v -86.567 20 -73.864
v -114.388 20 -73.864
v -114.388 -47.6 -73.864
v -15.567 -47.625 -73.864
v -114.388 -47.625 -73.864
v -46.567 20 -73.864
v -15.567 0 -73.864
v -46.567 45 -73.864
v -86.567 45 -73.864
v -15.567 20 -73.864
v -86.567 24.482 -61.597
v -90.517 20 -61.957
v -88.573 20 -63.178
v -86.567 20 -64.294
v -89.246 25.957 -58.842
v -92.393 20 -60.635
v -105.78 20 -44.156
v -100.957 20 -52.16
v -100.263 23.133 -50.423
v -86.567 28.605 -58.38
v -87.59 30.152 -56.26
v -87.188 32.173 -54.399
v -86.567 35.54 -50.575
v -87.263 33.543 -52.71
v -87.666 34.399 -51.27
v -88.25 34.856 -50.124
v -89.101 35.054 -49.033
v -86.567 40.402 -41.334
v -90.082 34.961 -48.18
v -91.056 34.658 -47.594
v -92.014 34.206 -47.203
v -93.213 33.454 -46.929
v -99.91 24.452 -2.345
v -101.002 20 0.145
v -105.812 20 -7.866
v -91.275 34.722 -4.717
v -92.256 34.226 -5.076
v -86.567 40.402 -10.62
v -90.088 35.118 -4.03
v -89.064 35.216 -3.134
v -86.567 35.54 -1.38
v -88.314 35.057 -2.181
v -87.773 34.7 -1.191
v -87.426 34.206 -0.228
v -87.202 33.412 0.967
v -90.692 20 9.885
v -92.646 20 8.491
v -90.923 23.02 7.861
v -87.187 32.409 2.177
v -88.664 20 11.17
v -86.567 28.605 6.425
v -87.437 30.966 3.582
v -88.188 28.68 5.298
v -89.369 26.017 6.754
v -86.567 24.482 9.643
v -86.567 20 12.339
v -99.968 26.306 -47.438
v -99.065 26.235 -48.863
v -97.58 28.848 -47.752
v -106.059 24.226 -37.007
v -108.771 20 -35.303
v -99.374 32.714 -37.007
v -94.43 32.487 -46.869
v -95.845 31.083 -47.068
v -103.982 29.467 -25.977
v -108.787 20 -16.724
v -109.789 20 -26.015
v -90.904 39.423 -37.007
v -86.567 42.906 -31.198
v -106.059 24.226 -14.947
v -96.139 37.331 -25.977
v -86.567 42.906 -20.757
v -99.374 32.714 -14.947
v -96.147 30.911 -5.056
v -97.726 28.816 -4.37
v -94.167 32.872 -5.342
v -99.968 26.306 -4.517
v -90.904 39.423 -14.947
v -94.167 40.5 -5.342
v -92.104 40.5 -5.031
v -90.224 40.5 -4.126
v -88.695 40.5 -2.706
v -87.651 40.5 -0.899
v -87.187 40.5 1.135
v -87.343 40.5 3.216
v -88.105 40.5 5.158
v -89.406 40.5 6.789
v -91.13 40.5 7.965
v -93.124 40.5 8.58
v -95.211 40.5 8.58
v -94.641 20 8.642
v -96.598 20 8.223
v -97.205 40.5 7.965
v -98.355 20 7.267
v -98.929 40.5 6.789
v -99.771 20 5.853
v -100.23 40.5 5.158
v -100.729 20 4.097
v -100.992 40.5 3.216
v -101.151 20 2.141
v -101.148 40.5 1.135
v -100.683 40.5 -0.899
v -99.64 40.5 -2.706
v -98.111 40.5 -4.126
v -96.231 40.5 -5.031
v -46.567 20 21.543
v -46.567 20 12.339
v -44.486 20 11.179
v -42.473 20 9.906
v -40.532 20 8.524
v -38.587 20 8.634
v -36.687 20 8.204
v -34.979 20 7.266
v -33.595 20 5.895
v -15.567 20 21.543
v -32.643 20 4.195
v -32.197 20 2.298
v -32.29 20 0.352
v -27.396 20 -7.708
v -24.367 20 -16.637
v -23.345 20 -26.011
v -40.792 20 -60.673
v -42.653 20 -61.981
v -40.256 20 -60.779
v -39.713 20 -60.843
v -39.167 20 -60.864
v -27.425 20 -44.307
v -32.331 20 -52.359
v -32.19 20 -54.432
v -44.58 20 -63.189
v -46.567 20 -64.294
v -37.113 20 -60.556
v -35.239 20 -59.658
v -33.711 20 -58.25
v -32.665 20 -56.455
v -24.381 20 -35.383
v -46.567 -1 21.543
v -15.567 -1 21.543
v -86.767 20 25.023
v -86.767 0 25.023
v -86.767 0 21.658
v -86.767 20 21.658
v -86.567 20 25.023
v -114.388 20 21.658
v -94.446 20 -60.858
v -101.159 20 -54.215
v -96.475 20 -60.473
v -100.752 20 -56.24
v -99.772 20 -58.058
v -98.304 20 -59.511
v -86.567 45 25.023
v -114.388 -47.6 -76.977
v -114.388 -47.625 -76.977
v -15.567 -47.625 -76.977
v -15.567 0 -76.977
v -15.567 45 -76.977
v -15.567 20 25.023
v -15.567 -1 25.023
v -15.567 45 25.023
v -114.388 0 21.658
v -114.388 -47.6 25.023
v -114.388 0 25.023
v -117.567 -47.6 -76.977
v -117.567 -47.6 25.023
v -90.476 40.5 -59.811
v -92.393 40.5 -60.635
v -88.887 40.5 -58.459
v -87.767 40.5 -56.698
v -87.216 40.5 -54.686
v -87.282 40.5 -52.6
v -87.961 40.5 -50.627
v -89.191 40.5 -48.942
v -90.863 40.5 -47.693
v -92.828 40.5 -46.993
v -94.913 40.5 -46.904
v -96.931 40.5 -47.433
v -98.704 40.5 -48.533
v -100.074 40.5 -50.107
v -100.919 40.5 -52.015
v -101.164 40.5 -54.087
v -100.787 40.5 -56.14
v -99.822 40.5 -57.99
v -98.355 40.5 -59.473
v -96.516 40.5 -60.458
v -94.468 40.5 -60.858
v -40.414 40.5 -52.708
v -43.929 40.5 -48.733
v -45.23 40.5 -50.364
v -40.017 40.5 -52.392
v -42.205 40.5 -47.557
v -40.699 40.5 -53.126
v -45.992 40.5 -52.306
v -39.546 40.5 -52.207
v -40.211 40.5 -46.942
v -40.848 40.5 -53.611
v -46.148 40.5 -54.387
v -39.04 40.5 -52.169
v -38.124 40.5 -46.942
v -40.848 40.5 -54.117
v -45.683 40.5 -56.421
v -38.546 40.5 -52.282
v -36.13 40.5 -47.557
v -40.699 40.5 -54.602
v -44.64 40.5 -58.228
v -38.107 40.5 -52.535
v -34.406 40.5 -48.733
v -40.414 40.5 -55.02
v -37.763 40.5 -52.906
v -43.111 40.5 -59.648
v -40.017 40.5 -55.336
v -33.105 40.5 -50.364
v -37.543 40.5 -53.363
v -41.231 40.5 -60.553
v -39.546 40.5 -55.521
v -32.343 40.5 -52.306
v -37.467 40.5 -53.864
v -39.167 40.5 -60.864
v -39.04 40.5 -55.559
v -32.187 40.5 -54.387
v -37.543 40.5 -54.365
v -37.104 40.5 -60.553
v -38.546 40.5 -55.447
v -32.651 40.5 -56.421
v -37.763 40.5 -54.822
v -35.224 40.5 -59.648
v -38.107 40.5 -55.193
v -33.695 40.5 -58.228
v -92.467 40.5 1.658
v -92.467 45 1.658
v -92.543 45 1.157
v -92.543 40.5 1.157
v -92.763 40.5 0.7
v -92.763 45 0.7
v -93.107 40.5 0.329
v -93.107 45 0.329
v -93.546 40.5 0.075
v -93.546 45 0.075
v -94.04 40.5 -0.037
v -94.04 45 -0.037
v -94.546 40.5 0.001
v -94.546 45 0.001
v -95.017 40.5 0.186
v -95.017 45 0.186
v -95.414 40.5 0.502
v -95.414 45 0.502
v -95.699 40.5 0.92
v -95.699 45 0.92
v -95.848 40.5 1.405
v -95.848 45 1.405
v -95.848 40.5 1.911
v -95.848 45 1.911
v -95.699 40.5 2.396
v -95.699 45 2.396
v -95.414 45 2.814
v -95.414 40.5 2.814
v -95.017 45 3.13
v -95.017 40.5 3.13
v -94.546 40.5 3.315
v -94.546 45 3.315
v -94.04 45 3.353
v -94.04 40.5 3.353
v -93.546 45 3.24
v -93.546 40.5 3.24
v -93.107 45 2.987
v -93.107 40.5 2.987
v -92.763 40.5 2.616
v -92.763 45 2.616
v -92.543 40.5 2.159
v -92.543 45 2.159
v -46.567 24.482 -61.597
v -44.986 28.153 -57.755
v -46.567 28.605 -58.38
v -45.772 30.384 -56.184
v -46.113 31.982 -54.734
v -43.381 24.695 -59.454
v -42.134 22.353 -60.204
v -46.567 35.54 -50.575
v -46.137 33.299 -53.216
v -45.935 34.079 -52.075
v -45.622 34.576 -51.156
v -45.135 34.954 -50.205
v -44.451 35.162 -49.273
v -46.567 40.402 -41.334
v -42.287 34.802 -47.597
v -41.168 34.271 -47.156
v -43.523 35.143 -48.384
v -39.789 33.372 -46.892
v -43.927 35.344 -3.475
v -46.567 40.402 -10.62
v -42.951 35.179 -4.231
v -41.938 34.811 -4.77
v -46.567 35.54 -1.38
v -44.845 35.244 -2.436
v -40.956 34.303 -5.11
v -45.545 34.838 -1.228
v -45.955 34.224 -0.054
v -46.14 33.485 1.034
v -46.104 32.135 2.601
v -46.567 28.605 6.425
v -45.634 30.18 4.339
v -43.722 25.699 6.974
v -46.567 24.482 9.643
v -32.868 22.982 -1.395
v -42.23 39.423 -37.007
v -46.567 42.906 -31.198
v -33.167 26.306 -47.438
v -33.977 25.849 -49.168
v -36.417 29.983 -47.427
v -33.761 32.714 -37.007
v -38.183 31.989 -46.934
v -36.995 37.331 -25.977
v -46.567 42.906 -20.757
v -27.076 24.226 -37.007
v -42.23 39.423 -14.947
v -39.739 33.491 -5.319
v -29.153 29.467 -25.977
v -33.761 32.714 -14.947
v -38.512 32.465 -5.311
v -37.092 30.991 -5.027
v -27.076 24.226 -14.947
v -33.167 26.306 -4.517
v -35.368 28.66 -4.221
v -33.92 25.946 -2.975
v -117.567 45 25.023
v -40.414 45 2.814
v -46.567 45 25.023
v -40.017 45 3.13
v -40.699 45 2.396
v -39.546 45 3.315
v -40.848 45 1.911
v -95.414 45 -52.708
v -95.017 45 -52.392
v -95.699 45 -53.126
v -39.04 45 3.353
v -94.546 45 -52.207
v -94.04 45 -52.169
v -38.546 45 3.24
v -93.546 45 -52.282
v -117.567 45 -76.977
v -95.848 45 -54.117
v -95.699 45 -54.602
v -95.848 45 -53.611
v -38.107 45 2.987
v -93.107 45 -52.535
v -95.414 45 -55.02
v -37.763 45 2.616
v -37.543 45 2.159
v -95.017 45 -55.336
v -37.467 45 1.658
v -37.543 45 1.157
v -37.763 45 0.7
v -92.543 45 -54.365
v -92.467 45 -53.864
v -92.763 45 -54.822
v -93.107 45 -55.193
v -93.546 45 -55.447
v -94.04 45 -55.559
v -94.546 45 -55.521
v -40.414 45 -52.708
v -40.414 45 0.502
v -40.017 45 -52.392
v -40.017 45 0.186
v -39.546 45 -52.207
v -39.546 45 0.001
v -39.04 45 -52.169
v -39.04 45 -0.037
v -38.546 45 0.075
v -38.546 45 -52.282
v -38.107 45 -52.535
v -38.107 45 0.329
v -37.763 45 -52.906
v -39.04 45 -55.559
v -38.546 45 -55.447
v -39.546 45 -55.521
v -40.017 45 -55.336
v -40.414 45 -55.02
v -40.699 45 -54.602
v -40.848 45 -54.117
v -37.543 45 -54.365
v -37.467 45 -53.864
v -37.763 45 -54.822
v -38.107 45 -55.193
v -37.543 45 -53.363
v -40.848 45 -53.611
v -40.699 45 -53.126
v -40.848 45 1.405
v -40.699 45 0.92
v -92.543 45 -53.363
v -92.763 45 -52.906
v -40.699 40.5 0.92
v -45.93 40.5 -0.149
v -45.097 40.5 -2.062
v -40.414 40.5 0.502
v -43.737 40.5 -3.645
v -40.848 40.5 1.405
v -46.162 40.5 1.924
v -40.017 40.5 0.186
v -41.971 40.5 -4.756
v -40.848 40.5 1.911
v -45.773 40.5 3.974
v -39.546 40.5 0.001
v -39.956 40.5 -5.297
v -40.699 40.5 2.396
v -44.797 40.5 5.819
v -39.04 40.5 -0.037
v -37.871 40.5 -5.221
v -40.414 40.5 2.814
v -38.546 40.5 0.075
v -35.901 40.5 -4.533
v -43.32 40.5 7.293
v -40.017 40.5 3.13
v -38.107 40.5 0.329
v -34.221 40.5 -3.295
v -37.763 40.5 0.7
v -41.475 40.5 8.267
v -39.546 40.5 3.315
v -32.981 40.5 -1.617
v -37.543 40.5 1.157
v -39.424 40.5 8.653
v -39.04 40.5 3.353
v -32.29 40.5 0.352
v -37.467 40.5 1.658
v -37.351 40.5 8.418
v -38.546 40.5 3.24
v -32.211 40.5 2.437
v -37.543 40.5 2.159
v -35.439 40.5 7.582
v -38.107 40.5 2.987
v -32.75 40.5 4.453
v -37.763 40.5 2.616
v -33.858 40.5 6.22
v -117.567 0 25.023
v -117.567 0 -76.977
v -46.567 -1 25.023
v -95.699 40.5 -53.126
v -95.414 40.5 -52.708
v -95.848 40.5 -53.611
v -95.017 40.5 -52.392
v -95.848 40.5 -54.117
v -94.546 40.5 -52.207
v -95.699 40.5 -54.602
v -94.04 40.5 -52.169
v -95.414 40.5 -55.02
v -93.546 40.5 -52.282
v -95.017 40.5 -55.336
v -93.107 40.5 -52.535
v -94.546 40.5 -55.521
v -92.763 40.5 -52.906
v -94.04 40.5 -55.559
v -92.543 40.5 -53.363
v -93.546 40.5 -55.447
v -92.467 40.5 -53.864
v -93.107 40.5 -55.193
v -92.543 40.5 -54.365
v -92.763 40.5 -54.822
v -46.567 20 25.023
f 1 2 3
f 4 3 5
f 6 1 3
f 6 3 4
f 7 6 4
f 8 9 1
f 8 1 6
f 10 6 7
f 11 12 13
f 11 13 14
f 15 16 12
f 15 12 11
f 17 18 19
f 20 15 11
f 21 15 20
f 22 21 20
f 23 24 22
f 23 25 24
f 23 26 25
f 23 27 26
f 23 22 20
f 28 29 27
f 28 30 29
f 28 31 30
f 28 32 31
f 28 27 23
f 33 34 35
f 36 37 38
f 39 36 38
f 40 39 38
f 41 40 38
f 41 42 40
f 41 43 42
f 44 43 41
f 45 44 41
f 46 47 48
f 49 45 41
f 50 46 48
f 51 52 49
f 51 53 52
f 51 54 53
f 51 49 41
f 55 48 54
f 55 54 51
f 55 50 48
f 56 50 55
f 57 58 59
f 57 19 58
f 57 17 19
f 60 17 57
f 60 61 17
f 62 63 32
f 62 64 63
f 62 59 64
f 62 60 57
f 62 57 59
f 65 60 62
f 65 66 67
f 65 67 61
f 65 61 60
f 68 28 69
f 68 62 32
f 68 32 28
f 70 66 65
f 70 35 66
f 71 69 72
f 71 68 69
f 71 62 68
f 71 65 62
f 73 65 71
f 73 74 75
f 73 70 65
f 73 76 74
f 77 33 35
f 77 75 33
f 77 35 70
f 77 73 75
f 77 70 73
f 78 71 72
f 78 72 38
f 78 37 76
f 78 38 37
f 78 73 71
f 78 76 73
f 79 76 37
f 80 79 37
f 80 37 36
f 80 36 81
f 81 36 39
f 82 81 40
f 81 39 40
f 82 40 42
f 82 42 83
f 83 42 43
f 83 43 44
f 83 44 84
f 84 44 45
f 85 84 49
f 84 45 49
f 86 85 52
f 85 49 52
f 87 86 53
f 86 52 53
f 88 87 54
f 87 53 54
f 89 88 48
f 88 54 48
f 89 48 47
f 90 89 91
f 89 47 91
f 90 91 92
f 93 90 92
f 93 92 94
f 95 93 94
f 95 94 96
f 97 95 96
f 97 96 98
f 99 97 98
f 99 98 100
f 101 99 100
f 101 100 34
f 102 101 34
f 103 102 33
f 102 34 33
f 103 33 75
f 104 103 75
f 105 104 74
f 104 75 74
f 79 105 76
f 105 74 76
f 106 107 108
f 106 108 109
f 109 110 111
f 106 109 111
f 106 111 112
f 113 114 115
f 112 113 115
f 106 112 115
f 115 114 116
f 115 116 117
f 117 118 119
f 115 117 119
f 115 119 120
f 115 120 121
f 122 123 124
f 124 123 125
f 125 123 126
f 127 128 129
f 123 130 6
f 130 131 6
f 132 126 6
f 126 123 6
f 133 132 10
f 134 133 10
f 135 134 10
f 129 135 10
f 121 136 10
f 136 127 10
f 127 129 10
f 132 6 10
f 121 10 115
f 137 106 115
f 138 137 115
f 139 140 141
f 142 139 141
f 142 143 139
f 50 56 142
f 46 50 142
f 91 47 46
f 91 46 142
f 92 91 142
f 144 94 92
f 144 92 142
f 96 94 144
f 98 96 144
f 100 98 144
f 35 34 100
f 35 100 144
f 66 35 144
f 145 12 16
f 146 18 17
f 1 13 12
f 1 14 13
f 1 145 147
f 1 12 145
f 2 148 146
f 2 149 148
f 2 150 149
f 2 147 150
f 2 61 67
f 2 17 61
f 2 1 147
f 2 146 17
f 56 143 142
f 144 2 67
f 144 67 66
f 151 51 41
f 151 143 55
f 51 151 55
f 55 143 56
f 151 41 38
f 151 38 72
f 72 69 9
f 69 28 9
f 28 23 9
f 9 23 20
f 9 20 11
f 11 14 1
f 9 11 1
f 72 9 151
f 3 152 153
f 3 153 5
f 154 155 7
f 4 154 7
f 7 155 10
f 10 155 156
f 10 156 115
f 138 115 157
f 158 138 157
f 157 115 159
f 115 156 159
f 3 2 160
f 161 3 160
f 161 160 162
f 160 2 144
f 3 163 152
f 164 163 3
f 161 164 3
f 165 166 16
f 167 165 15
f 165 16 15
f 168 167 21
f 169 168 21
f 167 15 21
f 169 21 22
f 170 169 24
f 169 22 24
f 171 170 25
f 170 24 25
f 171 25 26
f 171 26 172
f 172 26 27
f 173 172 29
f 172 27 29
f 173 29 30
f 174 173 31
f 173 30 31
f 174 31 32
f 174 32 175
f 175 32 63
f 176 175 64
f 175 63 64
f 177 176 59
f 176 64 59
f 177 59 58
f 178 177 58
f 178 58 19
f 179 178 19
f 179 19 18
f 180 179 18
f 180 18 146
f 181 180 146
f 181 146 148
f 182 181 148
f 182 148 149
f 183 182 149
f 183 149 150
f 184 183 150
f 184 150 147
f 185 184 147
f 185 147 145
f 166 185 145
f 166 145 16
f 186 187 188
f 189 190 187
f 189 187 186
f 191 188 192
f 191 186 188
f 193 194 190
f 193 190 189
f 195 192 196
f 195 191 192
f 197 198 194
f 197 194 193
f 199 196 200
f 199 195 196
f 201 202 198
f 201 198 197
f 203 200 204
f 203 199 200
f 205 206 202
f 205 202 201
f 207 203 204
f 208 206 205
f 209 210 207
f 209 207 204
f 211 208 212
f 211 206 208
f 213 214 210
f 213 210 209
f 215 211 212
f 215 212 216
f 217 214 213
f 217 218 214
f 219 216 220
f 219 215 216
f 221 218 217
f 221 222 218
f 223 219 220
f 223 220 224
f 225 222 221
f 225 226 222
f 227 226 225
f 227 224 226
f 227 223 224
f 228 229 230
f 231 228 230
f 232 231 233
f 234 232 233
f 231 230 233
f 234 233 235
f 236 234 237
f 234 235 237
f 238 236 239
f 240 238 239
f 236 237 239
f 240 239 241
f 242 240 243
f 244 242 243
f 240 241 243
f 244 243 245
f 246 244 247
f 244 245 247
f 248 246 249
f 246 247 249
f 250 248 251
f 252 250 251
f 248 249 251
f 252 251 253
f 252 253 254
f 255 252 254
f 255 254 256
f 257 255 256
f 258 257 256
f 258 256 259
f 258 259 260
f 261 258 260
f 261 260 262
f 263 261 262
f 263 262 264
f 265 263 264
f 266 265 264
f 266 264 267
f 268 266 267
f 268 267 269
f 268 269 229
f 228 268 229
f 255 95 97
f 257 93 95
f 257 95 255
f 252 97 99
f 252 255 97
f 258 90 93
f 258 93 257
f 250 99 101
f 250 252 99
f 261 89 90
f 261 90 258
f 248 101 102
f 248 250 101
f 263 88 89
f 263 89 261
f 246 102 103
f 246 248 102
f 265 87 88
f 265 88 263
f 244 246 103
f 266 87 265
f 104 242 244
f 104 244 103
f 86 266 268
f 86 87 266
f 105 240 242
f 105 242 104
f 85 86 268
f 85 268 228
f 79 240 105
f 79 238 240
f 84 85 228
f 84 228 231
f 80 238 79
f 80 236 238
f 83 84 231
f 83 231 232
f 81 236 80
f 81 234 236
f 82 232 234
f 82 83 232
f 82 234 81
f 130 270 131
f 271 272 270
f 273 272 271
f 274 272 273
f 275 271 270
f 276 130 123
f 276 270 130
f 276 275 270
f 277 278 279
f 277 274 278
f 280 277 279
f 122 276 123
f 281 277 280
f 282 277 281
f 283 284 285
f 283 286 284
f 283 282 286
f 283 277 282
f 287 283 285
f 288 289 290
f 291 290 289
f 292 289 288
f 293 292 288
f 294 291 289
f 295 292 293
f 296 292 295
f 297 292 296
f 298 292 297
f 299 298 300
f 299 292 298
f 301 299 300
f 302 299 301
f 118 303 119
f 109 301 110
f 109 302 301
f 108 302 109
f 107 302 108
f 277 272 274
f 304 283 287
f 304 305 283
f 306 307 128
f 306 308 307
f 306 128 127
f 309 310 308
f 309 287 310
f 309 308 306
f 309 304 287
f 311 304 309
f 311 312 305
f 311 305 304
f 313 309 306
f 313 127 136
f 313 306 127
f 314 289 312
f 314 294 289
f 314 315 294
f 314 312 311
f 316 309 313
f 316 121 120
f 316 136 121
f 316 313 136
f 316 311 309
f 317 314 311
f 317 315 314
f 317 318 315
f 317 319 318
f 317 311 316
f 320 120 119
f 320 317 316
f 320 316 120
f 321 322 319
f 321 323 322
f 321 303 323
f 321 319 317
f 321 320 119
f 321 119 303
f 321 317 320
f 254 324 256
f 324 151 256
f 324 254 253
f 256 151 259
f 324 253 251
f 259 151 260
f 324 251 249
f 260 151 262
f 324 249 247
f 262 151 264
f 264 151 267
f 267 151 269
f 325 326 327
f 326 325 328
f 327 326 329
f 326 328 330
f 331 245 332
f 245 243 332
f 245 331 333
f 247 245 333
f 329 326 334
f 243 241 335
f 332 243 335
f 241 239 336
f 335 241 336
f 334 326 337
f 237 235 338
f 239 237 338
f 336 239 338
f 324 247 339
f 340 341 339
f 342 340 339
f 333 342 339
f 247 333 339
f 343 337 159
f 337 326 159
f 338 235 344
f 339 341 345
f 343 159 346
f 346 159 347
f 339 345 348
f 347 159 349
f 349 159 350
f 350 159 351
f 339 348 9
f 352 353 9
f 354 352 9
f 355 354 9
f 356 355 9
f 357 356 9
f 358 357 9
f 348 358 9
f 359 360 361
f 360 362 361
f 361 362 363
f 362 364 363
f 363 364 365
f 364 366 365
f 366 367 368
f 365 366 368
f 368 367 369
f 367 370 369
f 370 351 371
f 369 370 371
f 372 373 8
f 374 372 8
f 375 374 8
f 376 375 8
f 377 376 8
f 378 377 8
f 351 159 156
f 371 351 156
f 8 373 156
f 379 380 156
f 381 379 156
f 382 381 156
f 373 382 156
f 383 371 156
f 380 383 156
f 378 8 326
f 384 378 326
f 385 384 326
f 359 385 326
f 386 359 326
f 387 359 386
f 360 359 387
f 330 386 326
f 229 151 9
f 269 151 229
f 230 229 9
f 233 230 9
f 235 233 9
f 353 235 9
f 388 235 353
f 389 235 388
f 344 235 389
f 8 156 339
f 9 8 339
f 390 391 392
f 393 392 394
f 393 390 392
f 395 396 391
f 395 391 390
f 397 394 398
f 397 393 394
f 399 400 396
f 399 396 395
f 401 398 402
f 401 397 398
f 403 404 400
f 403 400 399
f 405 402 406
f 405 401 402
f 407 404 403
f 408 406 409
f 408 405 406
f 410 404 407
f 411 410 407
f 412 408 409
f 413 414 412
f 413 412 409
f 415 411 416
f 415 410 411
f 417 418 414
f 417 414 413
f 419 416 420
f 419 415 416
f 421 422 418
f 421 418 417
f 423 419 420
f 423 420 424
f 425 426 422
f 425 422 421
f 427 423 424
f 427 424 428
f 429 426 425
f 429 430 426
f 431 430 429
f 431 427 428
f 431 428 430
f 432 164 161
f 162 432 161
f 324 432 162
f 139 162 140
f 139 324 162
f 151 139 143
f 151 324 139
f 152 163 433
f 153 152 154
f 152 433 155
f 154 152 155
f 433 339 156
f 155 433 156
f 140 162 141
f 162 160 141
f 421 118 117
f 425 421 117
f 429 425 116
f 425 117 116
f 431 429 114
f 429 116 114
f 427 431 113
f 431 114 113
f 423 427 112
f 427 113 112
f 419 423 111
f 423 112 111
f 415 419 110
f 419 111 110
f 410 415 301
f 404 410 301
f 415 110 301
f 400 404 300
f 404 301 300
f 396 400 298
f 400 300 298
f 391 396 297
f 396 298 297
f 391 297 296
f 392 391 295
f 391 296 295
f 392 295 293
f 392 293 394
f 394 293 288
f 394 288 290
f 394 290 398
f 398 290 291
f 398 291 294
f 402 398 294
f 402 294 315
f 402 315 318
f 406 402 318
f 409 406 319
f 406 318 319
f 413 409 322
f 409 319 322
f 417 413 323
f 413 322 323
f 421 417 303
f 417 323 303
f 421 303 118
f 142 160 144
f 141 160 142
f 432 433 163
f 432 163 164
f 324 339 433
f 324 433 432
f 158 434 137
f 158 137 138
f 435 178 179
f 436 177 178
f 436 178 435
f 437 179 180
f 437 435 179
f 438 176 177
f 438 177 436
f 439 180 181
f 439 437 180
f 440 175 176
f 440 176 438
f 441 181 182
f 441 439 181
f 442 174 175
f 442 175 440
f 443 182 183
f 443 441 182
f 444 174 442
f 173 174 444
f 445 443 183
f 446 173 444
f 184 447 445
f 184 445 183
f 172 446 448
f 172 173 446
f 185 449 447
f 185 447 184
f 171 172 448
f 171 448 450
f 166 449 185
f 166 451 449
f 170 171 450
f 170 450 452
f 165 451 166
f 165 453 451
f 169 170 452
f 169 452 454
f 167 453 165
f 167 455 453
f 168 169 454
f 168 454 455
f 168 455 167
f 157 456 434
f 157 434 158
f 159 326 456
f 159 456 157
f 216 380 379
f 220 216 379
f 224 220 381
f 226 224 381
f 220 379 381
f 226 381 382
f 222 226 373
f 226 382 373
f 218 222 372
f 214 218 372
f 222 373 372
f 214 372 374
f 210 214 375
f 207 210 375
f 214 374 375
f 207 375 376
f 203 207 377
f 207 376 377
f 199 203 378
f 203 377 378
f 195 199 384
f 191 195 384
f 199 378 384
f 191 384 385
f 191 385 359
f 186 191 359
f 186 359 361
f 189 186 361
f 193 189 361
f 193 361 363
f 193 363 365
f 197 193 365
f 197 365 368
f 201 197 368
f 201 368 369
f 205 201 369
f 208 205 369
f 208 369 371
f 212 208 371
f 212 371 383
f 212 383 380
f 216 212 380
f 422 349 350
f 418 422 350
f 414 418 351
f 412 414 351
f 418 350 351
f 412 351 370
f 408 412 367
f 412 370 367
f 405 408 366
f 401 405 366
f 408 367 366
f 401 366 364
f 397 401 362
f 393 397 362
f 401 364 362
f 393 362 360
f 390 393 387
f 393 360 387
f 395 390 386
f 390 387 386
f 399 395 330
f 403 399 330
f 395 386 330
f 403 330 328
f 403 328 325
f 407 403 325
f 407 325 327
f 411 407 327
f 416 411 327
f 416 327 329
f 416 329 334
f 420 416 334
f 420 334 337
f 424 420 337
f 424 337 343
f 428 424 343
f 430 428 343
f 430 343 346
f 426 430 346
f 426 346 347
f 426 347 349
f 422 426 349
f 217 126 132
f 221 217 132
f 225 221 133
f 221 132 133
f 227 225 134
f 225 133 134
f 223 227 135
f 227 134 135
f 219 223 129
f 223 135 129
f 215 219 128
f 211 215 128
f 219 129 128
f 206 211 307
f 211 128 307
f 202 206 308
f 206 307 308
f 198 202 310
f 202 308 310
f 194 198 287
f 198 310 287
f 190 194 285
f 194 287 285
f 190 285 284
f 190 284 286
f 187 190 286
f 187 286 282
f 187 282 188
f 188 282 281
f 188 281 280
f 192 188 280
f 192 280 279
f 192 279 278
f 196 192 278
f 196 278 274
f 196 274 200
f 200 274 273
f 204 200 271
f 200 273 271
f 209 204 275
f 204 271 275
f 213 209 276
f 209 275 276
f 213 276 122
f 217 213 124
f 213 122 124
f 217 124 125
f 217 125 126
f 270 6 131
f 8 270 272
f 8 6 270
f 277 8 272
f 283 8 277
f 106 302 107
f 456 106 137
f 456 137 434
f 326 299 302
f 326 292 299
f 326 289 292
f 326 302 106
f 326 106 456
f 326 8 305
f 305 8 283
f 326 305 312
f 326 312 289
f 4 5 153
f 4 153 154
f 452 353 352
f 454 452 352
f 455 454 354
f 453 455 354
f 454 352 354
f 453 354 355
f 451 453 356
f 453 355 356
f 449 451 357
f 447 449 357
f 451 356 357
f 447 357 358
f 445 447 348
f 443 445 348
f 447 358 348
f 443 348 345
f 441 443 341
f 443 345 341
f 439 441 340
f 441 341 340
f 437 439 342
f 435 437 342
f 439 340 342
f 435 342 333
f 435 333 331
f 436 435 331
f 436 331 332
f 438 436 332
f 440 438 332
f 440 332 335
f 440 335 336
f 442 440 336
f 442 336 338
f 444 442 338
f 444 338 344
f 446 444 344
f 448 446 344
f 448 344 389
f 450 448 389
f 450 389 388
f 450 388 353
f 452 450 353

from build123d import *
from build123d.topology import SkipClean

# Parameters (mm, degrees)
SKETCH1_W                   = 102
SKETCH1_H                   = 102
BOSS_EXTRUDE1_DEPTH         = 50
CUT_EXTRUDE_THIN1_OUTLINE_W = 40
CUT_EXTRUDE_THIN1_OUTLINE_H = 95.773670058
CUT_EXTRUDE_THIN1_DEPTH     = 50
SKETCH4_W                   = 40
SKETCH4_H                   = 6.202657501
CUT_EXTRUDE3_DEPTH          = 54
SKETCH5_W                   = 33.817621941
SKETCH5_H                   = 102.594578927
CUT_EXTRUDE4_DEPTH          = 20
SKETCH6_W                   = 27.820383201
SKETCH6_H                   = 98.886835029
CUT_EXTRUDE5_DEPTH          = 20
SKETCH7_W                   = 30.8
SKETCH7_H                   = 3.364819678
BOSS_EXTRUDE2_DEPTH         = 21
SKETCH9_W                   = 31
SKETCH9_H                   = 3.479961613
BOSS_EXTRUDE4_DEPTH         = 21
SKETCH11_W                  = 98.820383201
SKETCH11_H                  = 3.113164971
BOSS_EXTRUDE6_DEPTH         = 47.625
SKETCH14_W                  = 102
SKETCH14_H                  = 5
CUT_EXTRUDE7_DEPTH          = 105
SKETCH17_R                  = 7
CUT_EXTRUDE12_DEPTH         = 20.5
M3_CLEARANCE_HOLE1_D        = 3.4
SKETCH22_W                  = 3.179616799
SKETCH22_H                  = 102
BOSS_EXTRUDE7_DEPTH         = 47.6


# Read off the part's stored shape, not the designer's step: Cut-Extrude-Thin1
with BuildPart() as part:
    # Sketch1 → Boss-Extrude1 (new body)
    with BuildSketch(Plane(origin=(0, 0, 0), x_dir=(1, 0, 0), z_dir=(0, 1, 0))):
        with Locations((-66.567363259, 25.977216604)):
            Rectangle(SKETCH1_W, SKETCH1_H)
    extrude(amount=BOSS_EXTRUDE1_DEPTH)

    # Sketch2 → Cut-Revolve1 (revolve, cut)
    with SkipClean():  # the faces are left unmerged after this step: merging them gives an invalid solid
        with BuildSketch(Plane(origin=(0, 0, 0), x_dir=(1, 0, 0), z_dir=(0, 1, 0))):
            with BuildLine():
                ThreePointArc((-66.567363259, 73.602216604), (-114.192363259, 25.977216604), (-66.567363259, -21.647783396))
                Line((-66.567363259, -21.647783396), (-66.567363259, 73.602216604))
            make_face()
            with BuildLine():
                Line((-66.567363259, 73.602216604), (-66.567363259, -21.647783396))
                ThreePointArc((-66.567363259, -21.647783396), (-32.891402805, -7.69874385), (-18.942363259, 25.977216604))
                ThreePointArc((-18.942363259, 25.977216604), (-32.891402805, 59.653177058), (-66.567363259, 73.602216604))
            make_face()
        revolve(axis=Axis((-66.567363259, 0, 21.647783396), (0, 0, -1)), mode=Mode.SUBTRACT)
    add(part.part.scale(1), mode=Mode.REPLACE)  # the faces are merged on a copy

    # Cut-Extrude-Thin1 outline → Cut-Extrude-Thin1 (cut)
    with BuildSketch(Plane(origin=(0, 0, 0), x_dir=(1, 0, 0), z_dir=(0, 1, 0))):
        with Locations((-66.567363259, 25.977216604)):
            Rectangle(CUT_EXTRUDE_THIN1_OUTLINE_W, CUT_EXTRUDE_THIN1_OUTLINE_H)
    extrude(amount=CUT_EXTRUDE_THIN1_DEPTH, mode=Mode.SUBTRACT)

    # Sketch4 → Cut-Extrude3 (cut)
    with BuildSketch(Plane(origin=(0, 0, 0), x_dir=(1, 0, 0), z_dir=(0, 1, 0))):
        with Locations((-66.567363259, -25.010947176)):
            Rectangle(SKETCH4_W, SKETCH4_H)
    extrude(amount=CUT_EXTRUDE3_DEPTH, mode=Mode.SUBTRACT)

    # Sketch5 → Cut-Extrude4 (cut)
    with BuildSketch(Plane(origin=(0, 0, 0), x_dir=(1, 0, 0), z_dir=(0, 1, 0))):
        with Locations((-29.658552289, 22.56676217)):
            Rectangle(SKETCH5_W, SKETCH5_H)
    extrude(amount=CUT_EXTRUDE4_DEPTH, mode=Mode.SUBTRACT)

    # Sketch6 → Cut-Extrude5 (cut)
    with BuildSketch(Plane(origin=(0, 0, 0), x_dir=(-1, 0, 0), z_dir=(0, -1, 0))):
        with Locations((100.47755486, 24.420634119)):
            Rectangle(SKETCH6_W, SKETCH6_H)
    extrude(amount=-CUT_EXTRUDE5_DEPTH, mode=Mode.SUBTRACT)

    # Sketch7 → Boss-Extrude2 (add)
    with BuildSketch(Plane(origin=(0, 0, 0), x_dir=(1, 0, 0), z_dir=(0, 1, 0))):
        with Locations((-102.167363259, -23.340373557)):
            Rectangle(SKETCH7_W, SKETCH7_H)
    extrude(amount=BOSS_EXTRUDE2_DEPTH)

    # Sketch9 → Boss-Extrude4 (add)
    with BuildSketch(Plane.XZ.offset(-20)):
        with Locations((-31.067363259, 23.28280259)):
            Rectangle(SKETCH9_W, SKETCH9_H)
    extrude(amount=BOSS_EXTRUDE4_DEPTH)

    # Sketch11 → Boss-Extrude6 (add)
    with BuildSketch(Plane.XZ):
        with Locations((-64.97755486, -75.420634119)):
            Rectangle(SKETCH11_W, SKETCH11_H)
    extrude(amount=BOSS_EXTRUDE6_DEPTH)

    # Sketch14 → Cut-Extrude7 (cut)
    with BuildSketch(Plane(origin=(-15.567363259, 0, 0), x_dir=(0, 0, -1), z_dir=(1, 0, 0))):
        with Locations((25.977216604, 47.5)):
            Rectangle(SKETCH14_W, SKETCH14_H)
    extrude(amount=-CUT_EXTRUDE7_DEPTH, mode=Mode.SUBTRACT)

    # Sketch17 → Cut-Extrude12 (cut)
    with BuildSketch(Plane.XZ.offset(-20)):
        with Locations(Location((-94.167363259, 1.657963718, 0), (0, 0, 270))):
            Circle(SKETCH17_R)
        with Locations(Location((-94.167363259, -53.864051633, 0), (0, 0, 284.685382437))):
            Circle(SKETCH17_R)
        with Locations(Location((-39.167363259, 1.657963718, 0), (0, 0, 349.246729183))):
            Circle(SKETCH17_R)
        with Locations(Location((-39.167363259, -53.864051633, 0), (0, 0, 270))):
            Circle(SKETCH17_R)
    extrude(amount=-CUT_EXTRUDE12_DEPTH, mode=Mode.SUBTRACT)

    # M3 Clearance Hole1 (through all)
    with Locations(Plane(origin=(0, 40.5, 0), x_dir=(-1, 0, 0), z_dir=(0, -1, 0))):
        with Locations((94.167363259, -1.657963718), (39.167363259, -1.657963718), (39.167363259, 53.864051633), (94.167363259, 53.864051633)):
            Hole(M3_CLEARANCE_HOLE1_D / 2)

    # Sketch22 → Boss-Extrude7 (add)
    with BuildSketch(Plane.XZ):
        with Locations((-115.97755486, -25.977216604)):
            Rectangle(SKETCH22_W, SKETCH22_H)
    extrude(amount=BOSS_EXTRUDE7_DEPTH)


solid = part.part
